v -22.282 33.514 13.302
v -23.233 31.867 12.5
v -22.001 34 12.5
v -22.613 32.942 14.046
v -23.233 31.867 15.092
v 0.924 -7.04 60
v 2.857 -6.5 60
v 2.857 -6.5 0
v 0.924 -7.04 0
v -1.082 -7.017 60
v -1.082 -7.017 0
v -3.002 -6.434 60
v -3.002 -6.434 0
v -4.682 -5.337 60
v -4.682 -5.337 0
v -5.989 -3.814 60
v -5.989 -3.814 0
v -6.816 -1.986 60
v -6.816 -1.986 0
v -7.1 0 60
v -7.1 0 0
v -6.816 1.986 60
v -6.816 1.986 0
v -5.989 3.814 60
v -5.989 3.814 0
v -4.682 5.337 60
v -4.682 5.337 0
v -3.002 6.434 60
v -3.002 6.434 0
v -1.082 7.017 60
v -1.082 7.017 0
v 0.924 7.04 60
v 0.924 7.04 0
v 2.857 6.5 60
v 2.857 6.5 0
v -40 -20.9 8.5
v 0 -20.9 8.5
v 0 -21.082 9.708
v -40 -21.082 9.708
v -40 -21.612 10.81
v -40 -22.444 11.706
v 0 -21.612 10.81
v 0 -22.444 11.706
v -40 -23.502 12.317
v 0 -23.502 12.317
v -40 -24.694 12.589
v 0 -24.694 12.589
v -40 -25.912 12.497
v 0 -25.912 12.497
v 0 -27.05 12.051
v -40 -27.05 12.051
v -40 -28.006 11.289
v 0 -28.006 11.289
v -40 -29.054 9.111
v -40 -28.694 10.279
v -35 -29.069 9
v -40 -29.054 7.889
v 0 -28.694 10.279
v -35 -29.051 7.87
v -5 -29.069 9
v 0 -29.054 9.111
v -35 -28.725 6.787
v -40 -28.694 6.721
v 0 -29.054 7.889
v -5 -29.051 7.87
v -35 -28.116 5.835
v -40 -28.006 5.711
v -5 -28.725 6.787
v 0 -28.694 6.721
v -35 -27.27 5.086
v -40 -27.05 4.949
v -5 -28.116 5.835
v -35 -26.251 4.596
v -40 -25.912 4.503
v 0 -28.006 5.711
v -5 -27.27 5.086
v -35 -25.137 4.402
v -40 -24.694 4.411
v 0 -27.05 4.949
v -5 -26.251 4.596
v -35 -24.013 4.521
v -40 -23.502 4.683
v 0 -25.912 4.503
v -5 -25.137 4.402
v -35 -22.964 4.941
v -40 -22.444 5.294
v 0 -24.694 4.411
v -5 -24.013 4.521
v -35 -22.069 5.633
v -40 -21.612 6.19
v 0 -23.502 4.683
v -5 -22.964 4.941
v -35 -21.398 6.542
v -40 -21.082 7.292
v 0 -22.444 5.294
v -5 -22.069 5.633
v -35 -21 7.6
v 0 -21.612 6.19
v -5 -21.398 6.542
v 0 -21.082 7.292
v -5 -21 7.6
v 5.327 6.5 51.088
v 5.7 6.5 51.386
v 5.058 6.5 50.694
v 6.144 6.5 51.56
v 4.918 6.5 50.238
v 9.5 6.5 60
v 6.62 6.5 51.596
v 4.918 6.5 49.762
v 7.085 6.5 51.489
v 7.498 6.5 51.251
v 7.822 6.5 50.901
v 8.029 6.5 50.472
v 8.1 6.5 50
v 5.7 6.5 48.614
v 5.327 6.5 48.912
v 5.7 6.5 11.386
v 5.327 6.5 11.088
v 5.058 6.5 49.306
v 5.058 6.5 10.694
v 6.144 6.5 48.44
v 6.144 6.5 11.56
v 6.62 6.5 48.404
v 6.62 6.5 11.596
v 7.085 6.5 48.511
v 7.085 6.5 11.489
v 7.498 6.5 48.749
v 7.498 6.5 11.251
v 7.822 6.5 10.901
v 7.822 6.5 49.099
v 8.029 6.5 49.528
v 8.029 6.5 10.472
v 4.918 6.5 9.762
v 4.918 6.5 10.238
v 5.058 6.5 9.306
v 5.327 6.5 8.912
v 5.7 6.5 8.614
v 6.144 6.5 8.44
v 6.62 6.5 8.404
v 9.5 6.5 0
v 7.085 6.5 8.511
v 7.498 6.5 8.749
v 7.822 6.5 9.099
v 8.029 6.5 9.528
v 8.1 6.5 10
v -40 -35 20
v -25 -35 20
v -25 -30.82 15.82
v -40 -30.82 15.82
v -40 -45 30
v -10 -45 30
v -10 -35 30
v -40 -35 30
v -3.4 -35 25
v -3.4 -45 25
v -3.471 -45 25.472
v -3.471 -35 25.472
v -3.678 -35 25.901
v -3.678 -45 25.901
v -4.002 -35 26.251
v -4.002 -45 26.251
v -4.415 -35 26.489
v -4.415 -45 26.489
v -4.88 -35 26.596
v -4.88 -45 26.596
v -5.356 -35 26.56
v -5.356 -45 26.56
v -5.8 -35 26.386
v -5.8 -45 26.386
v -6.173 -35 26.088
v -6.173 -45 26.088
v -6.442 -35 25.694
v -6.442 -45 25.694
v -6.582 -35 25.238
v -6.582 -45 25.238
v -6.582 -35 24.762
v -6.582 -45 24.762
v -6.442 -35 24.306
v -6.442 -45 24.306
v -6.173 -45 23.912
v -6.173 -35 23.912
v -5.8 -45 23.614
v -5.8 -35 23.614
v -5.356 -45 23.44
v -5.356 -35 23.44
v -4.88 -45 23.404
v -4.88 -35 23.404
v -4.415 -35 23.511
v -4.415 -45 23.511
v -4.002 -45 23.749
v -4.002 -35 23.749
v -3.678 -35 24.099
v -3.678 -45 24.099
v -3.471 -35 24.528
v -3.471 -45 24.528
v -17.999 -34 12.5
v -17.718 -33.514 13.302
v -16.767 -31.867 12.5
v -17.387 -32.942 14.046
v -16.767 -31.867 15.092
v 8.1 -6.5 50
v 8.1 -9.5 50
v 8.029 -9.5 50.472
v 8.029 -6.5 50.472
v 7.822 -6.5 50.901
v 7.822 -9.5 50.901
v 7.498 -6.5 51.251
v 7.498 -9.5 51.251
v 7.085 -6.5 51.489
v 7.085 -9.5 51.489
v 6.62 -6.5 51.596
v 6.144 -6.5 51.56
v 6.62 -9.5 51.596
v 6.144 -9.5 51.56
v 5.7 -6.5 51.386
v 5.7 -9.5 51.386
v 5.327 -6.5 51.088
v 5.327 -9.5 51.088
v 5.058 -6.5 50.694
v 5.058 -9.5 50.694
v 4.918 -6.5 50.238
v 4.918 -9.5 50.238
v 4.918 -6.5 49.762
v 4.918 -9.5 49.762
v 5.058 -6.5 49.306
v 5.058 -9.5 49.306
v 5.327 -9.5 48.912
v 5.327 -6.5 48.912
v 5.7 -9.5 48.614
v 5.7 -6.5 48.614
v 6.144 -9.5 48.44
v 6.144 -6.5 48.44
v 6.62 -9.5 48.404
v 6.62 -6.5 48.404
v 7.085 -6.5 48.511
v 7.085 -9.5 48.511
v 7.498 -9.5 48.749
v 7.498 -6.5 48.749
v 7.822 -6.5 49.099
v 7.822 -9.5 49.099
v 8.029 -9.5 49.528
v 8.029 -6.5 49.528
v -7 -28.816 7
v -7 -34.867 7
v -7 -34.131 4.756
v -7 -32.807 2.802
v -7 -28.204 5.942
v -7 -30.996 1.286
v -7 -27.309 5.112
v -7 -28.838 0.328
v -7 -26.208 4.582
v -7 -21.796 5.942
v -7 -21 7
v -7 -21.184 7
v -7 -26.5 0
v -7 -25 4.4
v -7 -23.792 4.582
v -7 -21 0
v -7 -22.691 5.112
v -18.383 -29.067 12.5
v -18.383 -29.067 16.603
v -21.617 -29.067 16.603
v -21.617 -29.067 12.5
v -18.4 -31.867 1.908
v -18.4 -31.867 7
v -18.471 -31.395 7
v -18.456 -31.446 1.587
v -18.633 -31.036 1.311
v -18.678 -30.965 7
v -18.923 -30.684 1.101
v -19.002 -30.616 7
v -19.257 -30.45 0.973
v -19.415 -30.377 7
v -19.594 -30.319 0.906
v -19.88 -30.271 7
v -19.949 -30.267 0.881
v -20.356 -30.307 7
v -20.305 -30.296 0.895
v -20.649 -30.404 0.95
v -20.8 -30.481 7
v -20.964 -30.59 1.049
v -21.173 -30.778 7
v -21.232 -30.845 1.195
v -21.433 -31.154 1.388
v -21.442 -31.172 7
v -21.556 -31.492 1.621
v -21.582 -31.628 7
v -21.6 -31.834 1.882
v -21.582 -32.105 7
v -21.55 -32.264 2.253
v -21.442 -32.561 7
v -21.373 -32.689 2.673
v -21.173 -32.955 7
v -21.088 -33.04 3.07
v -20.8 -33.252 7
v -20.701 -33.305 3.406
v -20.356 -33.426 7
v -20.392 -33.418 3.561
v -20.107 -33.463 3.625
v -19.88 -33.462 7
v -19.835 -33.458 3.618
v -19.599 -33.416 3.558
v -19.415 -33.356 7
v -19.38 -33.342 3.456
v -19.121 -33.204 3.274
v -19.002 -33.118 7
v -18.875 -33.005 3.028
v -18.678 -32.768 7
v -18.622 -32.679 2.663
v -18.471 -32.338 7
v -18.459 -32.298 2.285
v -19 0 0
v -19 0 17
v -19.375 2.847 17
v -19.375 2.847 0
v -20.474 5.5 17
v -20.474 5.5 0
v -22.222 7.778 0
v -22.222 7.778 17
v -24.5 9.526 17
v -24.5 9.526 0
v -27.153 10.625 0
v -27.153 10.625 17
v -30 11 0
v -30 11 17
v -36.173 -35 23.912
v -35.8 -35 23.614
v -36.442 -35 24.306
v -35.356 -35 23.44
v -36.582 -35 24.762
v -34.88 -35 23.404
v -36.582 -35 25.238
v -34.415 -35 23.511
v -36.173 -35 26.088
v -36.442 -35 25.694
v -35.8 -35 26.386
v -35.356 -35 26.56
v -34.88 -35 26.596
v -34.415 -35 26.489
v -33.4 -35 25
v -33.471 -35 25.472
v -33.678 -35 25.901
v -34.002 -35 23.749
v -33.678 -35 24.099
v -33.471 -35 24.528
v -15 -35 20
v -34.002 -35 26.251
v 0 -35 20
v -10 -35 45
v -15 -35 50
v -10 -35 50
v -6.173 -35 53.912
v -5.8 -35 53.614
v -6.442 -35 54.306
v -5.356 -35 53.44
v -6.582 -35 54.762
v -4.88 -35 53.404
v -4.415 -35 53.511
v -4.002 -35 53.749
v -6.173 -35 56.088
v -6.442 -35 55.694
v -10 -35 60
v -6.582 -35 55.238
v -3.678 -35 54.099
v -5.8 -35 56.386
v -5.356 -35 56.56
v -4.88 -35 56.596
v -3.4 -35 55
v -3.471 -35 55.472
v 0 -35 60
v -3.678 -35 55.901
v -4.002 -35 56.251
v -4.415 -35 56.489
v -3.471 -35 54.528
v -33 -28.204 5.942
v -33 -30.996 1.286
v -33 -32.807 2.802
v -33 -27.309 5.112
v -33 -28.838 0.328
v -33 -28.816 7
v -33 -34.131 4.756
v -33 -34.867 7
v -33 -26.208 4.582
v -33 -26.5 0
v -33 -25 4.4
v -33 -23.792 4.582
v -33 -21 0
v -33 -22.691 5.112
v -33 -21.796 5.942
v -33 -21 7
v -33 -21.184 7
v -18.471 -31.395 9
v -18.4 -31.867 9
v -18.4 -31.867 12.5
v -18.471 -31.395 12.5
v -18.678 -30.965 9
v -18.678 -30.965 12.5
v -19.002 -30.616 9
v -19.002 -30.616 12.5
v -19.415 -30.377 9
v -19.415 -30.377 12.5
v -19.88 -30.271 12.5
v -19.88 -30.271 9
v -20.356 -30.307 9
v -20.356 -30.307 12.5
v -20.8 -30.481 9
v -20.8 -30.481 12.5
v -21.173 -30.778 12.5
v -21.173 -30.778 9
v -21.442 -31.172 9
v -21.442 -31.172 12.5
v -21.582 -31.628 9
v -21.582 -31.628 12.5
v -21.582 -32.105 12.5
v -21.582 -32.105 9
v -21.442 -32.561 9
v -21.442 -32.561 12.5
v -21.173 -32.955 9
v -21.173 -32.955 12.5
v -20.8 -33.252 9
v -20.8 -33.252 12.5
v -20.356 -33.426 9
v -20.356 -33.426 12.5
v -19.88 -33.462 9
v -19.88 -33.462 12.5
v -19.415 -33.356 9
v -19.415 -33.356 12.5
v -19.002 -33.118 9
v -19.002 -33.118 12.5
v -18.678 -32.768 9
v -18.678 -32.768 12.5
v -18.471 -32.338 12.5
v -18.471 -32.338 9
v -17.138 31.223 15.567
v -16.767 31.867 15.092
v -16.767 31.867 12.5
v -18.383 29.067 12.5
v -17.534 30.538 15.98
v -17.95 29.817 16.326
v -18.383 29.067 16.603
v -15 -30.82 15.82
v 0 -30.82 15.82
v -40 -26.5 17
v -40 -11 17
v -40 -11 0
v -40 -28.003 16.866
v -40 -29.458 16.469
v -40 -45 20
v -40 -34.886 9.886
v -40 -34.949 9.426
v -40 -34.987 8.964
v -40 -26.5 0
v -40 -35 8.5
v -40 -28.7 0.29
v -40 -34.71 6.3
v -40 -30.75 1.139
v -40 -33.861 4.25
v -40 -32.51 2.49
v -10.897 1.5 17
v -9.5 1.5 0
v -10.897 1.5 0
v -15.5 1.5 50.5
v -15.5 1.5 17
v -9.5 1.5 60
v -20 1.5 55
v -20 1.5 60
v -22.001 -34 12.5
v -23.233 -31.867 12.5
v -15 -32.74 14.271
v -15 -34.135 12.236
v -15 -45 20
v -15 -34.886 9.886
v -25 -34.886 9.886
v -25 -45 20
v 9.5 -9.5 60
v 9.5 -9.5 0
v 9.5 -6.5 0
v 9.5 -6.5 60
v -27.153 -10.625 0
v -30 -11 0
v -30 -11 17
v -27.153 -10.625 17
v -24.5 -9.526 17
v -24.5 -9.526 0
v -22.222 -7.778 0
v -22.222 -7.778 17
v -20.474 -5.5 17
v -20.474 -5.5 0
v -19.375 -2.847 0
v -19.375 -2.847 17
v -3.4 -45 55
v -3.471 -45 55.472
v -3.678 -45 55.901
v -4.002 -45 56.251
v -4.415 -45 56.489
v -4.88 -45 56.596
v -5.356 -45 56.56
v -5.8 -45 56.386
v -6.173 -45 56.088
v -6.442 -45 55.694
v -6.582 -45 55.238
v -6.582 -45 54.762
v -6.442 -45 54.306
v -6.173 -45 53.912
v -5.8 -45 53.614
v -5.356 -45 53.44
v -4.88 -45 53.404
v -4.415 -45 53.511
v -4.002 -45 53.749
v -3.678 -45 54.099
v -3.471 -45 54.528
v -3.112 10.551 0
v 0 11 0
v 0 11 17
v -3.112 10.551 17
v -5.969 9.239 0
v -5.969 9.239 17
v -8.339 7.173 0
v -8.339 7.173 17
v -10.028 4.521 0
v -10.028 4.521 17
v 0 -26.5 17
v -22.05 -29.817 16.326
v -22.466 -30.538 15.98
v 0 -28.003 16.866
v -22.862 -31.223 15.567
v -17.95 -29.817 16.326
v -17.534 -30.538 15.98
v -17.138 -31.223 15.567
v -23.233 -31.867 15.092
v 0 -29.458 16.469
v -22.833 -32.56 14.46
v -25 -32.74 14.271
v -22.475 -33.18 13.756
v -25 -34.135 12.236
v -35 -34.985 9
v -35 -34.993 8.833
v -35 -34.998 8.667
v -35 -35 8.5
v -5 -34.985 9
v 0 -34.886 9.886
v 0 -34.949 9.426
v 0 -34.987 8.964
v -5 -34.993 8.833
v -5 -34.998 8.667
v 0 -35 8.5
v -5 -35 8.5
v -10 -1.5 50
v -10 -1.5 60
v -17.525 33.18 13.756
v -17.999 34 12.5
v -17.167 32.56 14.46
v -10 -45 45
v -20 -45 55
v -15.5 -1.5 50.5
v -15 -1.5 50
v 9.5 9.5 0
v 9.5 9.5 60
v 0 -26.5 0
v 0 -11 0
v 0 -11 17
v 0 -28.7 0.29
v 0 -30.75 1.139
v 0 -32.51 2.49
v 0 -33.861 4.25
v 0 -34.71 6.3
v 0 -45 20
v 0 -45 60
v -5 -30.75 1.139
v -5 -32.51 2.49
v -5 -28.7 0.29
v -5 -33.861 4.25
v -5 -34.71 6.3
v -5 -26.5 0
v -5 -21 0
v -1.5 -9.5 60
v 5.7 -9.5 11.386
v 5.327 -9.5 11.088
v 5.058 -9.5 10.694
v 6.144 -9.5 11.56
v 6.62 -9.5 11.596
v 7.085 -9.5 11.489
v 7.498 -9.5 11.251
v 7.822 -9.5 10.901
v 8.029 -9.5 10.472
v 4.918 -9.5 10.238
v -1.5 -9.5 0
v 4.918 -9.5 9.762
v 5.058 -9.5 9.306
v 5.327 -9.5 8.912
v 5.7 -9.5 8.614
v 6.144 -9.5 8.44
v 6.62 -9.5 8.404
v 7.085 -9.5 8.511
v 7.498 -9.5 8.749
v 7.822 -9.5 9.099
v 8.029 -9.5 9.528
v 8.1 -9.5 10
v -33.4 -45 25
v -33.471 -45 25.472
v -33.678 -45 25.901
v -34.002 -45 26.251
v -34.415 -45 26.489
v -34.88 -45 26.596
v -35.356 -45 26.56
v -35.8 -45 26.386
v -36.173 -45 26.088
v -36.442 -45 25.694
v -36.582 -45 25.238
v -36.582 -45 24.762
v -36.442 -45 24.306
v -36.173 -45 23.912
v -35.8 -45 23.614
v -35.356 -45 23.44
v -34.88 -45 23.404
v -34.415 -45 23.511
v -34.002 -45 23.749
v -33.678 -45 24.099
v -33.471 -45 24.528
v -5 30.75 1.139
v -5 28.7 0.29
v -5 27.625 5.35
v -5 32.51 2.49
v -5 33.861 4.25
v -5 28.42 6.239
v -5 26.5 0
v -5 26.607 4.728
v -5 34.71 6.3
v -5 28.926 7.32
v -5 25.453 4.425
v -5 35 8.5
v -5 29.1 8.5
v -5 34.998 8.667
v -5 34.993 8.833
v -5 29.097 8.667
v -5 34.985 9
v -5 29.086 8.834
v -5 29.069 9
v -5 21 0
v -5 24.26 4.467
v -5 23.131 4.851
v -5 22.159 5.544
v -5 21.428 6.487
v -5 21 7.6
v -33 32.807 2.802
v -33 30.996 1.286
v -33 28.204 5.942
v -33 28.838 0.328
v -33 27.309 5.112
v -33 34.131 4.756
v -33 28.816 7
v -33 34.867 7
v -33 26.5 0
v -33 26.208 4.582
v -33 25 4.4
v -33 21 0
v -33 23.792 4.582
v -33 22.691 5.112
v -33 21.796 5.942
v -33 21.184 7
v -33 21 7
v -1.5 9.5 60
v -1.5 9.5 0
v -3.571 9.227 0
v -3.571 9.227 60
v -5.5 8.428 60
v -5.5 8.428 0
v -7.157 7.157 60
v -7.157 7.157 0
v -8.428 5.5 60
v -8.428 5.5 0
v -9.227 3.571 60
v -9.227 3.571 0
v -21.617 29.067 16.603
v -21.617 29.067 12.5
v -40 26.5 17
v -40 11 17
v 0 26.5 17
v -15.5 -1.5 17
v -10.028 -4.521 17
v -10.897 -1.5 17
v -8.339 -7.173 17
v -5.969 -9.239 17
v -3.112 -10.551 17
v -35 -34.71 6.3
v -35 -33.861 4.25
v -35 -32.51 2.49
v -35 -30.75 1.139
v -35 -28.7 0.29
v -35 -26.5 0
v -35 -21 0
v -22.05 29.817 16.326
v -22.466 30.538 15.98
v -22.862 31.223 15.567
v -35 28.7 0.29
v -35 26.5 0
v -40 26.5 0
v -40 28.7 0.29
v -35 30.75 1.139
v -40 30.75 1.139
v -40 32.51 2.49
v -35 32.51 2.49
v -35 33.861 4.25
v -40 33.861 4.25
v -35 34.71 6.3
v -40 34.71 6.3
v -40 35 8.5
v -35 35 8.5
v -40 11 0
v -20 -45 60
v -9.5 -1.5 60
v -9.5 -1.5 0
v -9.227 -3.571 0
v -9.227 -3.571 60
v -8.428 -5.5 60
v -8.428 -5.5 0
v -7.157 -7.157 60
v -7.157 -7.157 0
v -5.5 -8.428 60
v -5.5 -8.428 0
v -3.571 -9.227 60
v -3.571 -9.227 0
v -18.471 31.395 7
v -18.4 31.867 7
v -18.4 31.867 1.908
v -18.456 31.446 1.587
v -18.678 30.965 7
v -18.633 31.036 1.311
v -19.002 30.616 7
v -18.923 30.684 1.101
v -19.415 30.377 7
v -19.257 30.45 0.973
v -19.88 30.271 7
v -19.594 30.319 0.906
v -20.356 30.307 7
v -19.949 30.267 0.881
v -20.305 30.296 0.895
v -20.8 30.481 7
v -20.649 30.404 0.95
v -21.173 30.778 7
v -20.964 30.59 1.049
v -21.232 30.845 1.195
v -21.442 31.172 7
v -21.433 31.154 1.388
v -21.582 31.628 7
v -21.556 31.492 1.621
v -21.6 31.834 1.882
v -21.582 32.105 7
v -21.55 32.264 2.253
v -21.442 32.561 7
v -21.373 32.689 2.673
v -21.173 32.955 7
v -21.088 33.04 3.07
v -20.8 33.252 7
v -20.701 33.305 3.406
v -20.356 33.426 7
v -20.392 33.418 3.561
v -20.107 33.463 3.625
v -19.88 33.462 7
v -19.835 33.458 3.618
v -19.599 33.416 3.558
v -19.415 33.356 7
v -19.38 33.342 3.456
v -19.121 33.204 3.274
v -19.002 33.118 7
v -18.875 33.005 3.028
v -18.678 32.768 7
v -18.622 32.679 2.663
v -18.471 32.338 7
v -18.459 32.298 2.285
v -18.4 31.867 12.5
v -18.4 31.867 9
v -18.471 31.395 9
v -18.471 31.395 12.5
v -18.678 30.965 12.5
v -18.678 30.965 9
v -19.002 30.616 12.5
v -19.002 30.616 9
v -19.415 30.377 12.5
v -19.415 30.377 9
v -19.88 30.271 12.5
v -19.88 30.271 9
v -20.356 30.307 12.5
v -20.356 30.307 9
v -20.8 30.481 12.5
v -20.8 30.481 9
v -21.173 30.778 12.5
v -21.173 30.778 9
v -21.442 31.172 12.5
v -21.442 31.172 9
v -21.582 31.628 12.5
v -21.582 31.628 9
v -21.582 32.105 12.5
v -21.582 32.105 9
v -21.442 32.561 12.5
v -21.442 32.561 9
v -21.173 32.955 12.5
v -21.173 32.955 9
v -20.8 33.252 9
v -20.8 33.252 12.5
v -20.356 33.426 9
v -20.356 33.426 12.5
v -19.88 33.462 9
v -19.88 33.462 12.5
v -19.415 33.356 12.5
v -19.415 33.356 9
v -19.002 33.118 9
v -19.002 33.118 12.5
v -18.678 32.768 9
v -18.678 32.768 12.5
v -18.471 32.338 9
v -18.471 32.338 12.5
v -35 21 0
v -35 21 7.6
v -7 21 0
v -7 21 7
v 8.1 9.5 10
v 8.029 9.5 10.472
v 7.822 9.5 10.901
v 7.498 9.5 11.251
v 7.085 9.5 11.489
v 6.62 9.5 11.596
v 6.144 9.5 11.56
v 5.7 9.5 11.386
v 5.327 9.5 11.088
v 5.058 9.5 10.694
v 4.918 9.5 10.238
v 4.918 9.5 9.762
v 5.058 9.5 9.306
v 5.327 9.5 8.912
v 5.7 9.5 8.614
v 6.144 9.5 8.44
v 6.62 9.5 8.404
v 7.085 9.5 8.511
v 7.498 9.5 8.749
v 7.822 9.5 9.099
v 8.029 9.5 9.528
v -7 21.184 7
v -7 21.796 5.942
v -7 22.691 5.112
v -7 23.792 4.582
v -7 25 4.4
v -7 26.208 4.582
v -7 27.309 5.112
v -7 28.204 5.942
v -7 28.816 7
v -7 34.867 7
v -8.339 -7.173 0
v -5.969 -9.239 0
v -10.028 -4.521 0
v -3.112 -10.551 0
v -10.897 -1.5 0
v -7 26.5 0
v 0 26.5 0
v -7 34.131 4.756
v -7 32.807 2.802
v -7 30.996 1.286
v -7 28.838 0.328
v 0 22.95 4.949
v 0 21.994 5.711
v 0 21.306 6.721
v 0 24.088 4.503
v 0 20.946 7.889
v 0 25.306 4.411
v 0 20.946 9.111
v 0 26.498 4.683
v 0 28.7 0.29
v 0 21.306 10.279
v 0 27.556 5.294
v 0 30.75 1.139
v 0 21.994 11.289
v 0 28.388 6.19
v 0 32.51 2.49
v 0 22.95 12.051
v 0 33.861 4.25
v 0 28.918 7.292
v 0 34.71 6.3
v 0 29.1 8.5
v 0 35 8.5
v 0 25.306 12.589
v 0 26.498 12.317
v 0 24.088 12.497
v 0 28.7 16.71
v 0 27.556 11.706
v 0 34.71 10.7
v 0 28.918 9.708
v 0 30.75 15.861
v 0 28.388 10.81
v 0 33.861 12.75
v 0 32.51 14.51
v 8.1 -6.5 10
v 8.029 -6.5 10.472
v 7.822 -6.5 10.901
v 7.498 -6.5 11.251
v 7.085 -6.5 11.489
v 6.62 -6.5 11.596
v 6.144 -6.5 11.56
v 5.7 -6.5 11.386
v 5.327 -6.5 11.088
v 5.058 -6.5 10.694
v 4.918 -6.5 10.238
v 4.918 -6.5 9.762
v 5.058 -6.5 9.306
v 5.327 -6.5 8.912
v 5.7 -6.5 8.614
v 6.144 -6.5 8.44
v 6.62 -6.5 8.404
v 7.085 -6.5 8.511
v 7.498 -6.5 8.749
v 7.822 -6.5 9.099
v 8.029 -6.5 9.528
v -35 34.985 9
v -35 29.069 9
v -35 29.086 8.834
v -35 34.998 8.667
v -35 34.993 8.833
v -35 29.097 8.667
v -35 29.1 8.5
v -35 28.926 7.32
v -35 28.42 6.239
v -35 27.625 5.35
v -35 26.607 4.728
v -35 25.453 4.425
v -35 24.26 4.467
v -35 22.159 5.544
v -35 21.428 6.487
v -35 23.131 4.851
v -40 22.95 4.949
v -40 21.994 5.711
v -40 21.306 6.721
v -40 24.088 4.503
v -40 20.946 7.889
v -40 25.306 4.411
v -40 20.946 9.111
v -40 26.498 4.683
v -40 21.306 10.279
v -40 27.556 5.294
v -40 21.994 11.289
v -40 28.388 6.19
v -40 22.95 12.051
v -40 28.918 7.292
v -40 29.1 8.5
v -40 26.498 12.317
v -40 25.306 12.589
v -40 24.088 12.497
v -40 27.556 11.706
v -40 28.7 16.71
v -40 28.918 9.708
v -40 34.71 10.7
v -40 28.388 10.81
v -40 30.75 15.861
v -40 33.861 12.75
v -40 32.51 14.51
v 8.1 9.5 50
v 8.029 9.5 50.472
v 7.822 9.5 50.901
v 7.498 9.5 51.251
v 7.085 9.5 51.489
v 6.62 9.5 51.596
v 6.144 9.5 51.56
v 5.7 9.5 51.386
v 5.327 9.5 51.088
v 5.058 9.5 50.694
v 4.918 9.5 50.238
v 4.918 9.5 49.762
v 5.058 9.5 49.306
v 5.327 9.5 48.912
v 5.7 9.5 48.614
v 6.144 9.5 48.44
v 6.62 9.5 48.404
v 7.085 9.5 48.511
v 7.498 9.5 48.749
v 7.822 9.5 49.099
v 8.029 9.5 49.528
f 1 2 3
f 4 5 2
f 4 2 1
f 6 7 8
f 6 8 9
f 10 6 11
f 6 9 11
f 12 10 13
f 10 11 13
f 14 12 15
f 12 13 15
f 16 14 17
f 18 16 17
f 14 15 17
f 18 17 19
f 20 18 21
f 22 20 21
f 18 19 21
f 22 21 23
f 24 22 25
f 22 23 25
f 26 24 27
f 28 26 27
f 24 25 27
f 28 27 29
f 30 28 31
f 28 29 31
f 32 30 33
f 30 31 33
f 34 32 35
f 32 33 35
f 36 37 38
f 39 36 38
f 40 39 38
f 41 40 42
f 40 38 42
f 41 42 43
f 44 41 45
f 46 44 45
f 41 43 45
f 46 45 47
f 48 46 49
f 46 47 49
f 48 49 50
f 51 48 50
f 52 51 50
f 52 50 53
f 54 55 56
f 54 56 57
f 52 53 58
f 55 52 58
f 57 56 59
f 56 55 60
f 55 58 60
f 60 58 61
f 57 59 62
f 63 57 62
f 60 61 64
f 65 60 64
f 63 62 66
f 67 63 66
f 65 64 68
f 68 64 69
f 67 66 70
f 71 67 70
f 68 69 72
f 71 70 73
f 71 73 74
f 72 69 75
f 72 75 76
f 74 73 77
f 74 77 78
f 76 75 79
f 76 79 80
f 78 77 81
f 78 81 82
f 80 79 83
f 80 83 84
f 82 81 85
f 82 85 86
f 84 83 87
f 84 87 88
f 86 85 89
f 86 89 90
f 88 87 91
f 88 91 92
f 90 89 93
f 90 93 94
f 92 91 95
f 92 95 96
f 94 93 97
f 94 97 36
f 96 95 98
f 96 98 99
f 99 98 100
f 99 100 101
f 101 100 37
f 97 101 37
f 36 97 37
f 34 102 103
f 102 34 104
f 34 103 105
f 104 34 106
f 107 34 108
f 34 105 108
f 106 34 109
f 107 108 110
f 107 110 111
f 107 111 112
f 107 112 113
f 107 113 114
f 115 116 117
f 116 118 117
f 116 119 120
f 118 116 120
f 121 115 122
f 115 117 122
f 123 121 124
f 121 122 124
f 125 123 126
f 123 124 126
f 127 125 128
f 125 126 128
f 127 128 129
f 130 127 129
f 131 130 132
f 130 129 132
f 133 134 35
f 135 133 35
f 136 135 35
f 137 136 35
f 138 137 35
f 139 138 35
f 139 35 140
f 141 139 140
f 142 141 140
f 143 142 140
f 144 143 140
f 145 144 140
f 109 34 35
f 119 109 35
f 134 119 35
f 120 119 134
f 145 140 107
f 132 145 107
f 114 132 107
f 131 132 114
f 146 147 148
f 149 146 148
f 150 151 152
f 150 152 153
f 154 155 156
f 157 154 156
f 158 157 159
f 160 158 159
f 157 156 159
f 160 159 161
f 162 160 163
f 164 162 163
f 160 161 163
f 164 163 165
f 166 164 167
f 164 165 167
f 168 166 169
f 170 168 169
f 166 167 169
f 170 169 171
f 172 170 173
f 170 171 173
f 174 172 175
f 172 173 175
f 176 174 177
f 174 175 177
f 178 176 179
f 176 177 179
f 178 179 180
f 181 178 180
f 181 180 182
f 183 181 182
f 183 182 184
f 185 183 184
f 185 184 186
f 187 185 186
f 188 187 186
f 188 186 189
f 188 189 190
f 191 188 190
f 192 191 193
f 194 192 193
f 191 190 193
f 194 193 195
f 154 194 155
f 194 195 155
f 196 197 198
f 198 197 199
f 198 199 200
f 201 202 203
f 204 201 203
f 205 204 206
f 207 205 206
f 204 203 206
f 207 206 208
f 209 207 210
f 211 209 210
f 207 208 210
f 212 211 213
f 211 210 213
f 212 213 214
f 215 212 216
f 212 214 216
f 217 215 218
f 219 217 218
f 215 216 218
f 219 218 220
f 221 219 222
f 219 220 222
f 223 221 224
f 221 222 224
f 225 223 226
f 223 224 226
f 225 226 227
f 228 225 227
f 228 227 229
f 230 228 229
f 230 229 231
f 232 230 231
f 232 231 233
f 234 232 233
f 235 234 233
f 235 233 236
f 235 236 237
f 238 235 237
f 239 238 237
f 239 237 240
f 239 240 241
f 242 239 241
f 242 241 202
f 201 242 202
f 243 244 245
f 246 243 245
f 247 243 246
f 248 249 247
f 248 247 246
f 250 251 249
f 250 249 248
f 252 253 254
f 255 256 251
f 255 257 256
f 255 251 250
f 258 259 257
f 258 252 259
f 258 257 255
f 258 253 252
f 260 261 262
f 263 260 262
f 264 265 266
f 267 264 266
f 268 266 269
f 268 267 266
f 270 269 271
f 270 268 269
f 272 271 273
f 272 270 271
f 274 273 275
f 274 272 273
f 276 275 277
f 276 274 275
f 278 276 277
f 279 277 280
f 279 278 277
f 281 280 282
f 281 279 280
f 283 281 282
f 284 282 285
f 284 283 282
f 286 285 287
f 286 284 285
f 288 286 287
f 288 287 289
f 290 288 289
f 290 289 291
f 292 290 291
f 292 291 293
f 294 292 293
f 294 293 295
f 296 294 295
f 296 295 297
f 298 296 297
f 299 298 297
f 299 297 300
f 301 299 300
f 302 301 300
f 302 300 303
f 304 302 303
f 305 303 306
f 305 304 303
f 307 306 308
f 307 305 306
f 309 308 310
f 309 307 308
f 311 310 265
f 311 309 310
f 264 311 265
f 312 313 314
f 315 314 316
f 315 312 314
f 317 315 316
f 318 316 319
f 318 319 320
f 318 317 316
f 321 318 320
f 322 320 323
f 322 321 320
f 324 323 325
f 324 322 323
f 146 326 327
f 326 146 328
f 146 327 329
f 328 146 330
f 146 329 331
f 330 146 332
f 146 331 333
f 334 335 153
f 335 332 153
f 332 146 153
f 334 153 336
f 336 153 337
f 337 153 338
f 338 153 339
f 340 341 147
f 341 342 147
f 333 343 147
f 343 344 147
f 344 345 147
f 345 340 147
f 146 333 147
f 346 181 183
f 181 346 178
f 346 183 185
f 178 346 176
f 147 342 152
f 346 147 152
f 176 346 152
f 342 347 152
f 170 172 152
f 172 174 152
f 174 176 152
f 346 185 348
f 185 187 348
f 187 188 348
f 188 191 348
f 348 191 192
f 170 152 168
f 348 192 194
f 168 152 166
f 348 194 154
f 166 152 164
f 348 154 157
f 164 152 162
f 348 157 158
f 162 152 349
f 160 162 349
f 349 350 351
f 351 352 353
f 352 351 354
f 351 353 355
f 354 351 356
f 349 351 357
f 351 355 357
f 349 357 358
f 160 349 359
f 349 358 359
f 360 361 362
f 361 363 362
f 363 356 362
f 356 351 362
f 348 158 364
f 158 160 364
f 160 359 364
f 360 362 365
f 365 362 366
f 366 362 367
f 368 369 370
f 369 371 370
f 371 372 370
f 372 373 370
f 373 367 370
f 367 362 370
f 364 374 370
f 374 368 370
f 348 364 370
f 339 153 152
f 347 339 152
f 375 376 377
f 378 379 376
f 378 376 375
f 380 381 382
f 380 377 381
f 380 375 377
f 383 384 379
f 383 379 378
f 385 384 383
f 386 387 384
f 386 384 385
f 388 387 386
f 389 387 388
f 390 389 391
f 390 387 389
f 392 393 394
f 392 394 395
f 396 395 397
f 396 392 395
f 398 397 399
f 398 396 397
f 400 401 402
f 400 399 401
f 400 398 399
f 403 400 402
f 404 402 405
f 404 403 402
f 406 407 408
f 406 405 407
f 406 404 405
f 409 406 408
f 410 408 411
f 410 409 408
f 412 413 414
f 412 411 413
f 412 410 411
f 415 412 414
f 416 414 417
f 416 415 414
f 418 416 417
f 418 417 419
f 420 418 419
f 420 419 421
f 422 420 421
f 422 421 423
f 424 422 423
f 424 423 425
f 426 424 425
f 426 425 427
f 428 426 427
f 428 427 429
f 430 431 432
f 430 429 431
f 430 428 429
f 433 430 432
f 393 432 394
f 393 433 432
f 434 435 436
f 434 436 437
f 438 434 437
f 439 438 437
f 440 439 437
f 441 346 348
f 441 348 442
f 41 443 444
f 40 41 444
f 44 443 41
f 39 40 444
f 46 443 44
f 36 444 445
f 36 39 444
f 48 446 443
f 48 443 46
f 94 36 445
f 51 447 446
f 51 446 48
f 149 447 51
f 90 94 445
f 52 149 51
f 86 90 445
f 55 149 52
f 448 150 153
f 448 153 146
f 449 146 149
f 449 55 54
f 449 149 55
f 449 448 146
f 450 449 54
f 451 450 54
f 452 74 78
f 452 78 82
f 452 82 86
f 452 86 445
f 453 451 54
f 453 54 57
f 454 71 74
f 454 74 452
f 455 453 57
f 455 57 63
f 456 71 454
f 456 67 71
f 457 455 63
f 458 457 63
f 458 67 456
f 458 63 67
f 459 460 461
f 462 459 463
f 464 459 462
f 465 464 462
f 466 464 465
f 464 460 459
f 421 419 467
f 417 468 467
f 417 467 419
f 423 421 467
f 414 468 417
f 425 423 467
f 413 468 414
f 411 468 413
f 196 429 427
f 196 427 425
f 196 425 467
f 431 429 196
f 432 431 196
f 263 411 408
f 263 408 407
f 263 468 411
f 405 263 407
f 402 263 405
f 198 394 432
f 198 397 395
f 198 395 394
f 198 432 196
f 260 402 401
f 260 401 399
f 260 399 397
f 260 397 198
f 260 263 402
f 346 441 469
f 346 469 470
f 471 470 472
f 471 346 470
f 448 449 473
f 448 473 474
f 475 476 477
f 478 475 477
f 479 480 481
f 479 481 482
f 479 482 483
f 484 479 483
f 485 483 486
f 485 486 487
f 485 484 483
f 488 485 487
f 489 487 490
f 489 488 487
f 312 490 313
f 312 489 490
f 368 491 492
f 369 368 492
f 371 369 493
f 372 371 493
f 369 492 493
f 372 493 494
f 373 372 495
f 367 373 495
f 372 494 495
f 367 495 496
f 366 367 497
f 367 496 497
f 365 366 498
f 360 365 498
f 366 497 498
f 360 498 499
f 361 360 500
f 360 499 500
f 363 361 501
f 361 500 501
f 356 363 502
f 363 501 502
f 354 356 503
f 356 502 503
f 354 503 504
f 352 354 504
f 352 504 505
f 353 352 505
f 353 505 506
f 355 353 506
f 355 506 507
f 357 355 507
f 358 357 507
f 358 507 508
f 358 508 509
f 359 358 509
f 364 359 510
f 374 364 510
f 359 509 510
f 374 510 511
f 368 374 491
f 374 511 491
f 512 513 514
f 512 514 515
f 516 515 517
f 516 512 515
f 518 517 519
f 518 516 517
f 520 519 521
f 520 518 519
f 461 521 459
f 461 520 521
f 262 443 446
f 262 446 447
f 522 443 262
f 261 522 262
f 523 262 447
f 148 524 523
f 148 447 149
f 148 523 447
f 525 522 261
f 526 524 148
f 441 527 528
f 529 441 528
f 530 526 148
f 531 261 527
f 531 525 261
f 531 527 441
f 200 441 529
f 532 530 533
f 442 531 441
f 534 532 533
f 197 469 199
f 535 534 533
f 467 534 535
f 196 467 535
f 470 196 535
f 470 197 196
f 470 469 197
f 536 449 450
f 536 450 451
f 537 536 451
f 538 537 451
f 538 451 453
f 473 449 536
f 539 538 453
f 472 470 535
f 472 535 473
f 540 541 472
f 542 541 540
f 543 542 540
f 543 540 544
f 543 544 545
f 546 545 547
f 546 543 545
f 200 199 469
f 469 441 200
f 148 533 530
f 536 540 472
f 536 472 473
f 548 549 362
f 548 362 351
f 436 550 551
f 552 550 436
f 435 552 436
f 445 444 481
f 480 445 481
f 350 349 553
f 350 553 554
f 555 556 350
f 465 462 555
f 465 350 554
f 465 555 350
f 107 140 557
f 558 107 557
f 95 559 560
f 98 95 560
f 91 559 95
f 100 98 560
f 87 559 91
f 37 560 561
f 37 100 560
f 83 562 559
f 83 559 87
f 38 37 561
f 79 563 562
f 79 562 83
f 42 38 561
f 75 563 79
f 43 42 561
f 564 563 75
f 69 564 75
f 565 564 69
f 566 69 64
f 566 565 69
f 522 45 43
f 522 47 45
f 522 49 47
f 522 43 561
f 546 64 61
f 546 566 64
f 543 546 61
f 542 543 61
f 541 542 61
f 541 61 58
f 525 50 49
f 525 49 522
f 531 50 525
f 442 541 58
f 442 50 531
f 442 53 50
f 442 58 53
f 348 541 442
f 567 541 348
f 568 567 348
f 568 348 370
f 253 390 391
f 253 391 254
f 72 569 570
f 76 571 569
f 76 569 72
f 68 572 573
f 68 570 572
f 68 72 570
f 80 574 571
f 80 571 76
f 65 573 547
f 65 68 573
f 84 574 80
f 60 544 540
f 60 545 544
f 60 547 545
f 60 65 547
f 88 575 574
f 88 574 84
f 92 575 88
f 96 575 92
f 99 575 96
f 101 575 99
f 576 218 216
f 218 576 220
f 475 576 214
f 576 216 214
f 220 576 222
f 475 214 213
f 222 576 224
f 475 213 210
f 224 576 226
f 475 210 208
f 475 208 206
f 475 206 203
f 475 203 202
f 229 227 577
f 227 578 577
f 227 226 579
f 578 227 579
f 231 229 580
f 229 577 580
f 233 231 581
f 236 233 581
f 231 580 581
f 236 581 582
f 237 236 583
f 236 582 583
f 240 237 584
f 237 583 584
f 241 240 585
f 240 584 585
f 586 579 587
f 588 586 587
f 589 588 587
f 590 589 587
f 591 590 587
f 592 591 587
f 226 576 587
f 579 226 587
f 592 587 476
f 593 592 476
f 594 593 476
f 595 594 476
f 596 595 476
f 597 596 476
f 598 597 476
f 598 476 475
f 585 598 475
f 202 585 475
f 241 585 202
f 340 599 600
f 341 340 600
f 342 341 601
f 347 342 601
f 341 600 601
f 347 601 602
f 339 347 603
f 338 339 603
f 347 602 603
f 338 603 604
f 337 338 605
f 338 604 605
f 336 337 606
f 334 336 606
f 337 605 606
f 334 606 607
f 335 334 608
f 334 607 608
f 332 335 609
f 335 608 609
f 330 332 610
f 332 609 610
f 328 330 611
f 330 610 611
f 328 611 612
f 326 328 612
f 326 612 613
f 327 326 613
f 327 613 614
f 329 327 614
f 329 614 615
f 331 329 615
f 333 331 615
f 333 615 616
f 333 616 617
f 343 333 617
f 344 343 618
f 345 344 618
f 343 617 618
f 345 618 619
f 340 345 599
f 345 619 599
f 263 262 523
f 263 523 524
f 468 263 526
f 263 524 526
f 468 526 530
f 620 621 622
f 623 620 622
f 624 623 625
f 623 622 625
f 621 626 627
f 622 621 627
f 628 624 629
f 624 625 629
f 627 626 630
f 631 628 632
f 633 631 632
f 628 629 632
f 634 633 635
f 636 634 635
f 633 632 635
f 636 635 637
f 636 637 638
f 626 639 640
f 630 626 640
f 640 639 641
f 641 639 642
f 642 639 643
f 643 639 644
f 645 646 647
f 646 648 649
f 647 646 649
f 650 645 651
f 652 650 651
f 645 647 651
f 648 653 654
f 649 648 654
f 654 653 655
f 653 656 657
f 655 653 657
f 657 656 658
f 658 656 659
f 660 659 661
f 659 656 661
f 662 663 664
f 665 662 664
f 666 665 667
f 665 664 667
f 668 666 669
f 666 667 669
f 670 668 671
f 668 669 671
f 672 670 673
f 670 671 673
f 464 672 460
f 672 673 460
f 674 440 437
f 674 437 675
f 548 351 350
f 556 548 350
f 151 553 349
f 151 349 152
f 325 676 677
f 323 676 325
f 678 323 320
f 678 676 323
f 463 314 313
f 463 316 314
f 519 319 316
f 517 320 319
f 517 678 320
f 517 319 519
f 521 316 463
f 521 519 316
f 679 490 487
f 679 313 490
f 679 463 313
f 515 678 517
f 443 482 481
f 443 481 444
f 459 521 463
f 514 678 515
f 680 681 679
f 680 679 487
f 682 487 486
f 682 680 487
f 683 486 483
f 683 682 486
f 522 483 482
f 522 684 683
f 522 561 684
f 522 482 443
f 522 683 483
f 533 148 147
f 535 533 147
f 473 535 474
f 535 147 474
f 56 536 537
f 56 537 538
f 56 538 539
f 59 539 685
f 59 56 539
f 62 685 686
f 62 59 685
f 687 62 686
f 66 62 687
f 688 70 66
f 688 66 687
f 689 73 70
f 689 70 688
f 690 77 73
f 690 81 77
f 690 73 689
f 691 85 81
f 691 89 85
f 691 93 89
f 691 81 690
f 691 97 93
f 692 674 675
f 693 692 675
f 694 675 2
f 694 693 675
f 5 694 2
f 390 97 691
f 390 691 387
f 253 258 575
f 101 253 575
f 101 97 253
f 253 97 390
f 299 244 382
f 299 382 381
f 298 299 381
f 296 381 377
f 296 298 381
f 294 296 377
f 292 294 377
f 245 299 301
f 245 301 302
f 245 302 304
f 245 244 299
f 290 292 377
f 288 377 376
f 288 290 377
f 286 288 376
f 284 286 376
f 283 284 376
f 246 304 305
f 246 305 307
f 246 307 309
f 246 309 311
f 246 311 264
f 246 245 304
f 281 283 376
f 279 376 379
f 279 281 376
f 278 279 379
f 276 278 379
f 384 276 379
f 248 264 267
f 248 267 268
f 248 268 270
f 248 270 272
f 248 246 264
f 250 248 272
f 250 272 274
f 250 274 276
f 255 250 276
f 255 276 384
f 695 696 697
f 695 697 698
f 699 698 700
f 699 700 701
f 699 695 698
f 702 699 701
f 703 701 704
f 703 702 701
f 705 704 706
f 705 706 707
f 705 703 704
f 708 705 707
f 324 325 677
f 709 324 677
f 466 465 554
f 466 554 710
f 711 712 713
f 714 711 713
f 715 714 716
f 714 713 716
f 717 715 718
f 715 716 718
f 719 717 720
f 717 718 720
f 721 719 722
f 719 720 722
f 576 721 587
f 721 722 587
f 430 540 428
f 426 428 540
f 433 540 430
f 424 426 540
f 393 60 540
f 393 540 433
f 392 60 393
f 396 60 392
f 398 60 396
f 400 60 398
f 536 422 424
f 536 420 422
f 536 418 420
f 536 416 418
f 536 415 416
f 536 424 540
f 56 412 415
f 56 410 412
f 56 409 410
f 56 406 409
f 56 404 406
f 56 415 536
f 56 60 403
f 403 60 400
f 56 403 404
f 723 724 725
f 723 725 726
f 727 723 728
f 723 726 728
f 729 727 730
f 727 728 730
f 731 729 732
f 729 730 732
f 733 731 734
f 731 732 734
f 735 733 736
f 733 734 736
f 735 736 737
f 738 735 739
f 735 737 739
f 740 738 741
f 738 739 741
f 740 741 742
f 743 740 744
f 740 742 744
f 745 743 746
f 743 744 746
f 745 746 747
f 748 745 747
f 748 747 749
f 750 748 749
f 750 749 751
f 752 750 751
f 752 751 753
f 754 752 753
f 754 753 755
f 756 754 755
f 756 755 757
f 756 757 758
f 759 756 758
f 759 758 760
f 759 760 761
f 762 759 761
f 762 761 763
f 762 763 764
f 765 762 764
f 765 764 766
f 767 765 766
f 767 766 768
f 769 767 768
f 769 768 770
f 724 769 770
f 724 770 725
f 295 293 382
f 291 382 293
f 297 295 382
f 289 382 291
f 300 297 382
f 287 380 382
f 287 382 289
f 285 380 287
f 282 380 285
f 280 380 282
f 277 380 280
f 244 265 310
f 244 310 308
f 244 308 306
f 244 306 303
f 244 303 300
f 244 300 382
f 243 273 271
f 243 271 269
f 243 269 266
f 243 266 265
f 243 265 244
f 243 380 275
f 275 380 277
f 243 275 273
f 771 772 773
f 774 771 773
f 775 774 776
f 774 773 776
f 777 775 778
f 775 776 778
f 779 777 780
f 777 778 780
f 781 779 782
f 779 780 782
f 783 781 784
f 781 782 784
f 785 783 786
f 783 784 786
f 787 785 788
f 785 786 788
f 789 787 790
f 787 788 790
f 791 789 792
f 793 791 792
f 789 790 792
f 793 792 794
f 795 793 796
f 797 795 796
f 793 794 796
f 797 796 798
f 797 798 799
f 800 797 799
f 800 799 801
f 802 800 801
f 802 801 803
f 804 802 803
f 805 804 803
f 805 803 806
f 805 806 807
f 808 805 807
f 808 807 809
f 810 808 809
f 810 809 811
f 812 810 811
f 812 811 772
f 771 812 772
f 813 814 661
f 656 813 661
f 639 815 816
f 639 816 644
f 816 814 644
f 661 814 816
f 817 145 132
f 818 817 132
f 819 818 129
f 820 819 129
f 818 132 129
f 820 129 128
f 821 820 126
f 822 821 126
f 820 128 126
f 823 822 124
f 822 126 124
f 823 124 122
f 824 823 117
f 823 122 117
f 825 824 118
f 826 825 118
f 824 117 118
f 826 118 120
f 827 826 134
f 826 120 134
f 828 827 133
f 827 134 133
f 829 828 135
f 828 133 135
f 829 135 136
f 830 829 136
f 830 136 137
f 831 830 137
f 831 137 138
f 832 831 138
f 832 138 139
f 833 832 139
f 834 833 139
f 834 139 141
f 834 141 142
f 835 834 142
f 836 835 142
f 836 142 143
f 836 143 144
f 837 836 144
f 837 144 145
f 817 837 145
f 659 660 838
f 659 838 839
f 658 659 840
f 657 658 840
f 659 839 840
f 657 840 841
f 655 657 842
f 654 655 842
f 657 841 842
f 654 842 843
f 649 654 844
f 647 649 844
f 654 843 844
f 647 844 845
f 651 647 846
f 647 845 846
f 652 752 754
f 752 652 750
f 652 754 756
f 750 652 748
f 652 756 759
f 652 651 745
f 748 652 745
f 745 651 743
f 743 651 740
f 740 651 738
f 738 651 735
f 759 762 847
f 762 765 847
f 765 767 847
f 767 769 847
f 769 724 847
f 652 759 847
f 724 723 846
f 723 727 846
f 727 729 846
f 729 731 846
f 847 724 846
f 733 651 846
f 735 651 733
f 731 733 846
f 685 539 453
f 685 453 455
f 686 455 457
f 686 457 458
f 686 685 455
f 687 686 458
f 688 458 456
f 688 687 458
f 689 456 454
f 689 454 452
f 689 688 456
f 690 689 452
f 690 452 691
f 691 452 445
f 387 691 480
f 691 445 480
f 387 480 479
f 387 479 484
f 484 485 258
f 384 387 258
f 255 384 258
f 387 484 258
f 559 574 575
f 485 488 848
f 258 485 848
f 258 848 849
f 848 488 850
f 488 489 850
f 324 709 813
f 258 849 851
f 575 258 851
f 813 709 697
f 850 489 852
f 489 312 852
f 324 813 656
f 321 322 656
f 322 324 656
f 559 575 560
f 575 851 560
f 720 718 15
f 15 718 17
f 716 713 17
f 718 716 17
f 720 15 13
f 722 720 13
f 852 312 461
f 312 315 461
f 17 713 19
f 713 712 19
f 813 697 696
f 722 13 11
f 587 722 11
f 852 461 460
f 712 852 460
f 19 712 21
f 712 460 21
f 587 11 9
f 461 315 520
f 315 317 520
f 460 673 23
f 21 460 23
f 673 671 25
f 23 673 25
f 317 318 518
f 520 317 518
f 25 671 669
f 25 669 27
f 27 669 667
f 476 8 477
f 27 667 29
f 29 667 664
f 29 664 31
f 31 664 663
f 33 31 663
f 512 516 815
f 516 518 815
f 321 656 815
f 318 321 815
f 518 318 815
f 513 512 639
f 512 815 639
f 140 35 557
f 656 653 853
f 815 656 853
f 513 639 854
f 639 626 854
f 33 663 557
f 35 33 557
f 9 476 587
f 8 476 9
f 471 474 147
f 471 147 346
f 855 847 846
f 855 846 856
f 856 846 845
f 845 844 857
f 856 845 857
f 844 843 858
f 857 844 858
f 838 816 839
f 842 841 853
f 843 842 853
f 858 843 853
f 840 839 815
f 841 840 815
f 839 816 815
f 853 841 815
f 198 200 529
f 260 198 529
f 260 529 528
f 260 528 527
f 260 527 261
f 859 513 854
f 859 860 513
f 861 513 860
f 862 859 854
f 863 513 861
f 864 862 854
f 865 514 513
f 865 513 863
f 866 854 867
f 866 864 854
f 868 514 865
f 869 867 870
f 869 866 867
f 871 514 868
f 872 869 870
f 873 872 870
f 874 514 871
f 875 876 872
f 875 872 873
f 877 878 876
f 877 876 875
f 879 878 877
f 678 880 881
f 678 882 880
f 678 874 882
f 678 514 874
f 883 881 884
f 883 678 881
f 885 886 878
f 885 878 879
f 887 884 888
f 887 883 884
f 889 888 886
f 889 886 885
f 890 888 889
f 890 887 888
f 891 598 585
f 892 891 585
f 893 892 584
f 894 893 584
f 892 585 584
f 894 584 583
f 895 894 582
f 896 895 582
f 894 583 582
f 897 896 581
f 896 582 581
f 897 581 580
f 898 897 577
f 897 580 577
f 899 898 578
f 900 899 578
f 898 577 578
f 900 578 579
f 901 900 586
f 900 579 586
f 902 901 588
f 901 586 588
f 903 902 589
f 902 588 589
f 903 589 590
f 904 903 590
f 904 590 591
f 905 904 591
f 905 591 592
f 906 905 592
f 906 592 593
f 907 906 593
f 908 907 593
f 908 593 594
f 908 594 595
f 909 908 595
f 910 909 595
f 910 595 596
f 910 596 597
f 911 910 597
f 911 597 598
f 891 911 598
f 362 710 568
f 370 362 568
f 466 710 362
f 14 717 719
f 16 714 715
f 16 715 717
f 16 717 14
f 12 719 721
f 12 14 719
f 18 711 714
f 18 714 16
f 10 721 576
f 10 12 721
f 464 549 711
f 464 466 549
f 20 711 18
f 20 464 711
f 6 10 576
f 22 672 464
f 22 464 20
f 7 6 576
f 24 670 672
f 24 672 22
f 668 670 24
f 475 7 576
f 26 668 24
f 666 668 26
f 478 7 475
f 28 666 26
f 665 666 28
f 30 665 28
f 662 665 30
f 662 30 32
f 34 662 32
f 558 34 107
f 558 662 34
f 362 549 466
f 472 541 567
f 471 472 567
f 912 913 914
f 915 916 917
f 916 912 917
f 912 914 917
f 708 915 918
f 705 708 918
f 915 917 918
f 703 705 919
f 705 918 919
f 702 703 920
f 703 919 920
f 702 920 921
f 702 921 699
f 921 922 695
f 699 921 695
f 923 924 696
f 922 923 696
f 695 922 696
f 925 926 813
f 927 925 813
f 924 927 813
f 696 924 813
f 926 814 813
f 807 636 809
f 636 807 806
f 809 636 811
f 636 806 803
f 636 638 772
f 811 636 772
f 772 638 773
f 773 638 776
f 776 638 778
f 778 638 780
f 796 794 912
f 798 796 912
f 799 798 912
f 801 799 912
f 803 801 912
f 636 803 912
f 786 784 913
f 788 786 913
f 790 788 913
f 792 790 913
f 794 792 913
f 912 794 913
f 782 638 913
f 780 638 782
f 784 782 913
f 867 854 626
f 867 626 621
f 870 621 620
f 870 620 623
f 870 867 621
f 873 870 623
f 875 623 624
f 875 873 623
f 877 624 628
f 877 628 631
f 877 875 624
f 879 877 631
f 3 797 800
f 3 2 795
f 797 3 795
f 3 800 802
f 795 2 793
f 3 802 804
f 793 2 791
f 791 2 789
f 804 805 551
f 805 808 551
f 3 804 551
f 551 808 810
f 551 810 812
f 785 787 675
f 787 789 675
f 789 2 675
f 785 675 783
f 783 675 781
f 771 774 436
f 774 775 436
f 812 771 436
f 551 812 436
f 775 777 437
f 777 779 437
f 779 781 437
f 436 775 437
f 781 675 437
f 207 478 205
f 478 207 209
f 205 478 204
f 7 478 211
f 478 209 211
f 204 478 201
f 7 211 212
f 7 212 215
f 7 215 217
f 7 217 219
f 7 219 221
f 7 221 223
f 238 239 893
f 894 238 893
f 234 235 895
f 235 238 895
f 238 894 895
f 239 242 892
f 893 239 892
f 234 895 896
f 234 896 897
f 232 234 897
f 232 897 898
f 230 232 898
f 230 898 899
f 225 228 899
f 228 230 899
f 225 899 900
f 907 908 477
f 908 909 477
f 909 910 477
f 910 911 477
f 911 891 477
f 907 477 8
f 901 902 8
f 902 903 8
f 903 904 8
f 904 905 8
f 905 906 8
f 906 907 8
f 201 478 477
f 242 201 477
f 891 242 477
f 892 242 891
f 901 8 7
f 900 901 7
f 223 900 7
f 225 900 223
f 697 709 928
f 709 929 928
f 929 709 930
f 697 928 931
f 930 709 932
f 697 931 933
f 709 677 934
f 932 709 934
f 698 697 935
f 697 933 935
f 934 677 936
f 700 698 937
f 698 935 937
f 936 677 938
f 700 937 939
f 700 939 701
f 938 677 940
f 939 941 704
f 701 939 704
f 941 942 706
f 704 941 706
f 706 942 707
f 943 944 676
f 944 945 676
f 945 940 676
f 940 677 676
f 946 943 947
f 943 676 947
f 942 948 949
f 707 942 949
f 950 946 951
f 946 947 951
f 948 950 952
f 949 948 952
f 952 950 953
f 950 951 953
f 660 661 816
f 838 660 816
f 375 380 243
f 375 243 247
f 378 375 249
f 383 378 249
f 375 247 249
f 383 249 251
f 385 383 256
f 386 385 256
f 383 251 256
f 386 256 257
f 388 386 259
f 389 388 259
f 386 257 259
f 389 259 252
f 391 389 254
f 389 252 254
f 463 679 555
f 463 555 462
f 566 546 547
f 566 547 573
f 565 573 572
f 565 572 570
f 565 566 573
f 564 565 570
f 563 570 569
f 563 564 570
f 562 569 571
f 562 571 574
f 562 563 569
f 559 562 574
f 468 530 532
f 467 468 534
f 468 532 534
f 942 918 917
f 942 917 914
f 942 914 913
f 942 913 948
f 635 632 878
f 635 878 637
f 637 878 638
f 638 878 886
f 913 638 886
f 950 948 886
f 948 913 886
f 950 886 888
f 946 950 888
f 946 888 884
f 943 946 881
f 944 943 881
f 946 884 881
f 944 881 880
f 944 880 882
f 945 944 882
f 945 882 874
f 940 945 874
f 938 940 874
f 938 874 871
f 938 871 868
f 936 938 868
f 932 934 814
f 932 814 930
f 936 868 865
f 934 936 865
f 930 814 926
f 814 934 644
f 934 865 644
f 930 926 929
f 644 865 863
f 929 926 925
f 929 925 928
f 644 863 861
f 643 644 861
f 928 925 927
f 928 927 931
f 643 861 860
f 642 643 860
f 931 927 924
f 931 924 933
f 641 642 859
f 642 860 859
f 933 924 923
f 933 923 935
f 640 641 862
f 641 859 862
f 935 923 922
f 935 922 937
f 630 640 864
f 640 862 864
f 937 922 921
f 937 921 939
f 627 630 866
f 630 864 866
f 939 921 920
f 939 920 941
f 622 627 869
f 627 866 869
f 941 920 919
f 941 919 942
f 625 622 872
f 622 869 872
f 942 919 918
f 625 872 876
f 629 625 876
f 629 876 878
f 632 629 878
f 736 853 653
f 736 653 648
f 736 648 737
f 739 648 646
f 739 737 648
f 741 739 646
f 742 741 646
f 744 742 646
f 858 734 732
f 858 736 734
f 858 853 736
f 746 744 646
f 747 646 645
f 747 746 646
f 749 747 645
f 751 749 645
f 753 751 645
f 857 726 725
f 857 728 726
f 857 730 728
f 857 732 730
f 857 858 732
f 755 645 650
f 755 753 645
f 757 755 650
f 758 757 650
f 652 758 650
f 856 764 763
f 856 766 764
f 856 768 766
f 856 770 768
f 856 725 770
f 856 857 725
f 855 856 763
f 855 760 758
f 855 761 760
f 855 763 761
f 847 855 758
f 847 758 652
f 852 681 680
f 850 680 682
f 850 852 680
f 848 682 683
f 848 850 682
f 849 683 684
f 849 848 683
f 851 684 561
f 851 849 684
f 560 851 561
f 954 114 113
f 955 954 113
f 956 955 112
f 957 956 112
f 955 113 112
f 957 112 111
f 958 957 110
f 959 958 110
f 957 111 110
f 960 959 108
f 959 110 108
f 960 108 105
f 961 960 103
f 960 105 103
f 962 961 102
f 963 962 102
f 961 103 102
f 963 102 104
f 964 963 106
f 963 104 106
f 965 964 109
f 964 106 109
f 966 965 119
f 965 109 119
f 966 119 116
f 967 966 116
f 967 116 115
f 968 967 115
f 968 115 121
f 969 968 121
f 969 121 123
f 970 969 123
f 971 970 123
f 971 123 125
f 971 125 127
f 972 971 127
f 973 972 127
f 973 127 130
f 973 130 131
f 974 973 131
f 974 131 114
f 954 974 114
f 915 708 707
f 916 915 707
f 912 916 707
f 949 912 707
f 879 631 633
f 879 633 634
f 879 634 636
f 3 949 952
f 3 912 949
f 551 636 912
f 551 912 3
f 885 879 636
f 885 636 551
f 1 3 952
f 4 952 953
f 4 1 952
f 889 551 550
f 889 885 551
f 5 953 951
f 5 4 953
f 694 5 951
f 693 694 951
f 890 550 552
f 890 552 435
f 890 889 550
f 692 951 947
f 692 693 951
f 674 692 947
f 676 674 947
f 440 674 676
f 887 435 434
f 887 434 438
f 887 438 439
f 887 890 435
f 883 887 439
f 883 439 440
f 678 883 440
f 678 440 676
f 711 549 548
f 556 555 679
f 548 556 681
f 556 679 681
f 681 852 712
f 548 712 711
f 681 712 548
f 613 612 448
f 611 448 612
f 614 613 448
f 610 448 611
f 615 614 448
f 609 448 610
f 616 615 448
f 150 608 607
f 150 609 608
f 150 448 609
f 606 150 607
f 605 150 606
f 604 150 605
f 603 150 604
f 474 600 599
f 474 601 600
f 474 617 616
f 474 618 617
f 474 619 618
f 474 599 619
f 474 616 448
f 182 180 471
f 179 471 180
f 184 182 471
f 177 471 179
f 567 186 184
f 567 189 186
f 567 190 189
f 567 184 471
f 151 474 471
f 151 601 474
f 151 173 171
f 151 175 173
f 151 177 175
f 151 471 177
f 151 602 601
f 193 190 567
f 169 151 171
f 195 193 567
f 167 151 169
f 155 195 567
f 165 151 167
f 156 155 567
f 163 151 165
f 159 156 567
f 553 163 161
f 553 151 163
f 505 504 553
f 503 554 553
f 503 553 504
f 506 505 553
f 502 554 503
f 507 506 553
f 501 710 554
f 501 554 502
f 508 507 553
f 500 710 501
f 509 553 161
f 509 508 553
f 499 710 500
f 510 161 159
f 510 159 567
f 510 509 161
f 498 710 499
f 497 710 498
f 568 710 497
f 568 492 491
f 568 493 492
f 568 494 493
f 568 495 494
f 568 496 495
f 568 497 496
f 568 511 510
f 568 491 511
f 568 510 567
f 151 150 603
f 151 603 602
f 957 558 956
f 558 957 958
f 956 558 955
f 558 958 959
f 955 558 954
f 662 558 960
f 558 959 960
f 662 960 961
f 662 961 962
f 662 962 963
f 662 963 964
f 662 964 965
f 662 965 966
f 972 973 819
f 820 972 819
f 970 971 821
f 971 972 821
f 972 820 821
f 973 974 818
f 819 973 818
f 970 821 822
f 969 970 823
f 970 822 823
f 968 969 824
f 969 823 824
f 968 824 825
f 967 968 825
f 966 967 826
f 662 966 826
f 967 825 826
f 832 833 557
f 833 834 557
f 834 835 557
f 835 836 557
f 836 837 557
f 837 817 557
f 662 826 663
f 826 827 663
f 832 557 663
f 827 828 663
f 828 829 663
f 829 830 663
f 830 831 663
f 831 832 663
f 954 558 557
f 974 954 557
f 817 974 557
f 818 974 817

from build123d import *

# Parameters (mm, degrees)
F1_R      = 4.1
F2_DEPTH  = 40
F3_R      = 11
F4_DEPTH  = 17
F5_W      = 6
F5_H      = 3
F6_DEPTH  = 60
F7_R      = 1.6
F8_DEPTH  = 19
F10_DEPTH = 17
F11_W     = 2
F11_H     = 7
F11_H_2   = 2
F11_W_2   = 26
F12_DEPTH = 15
F13_R     = 1.6
F14_DEPTH = 17
F16_DEPTH = 4.5
F19_DEPTH = 15
F21_R     = 1.6
F22_DEPTH = 10
F24_DEPTH = 46.5


# Not quite as in the source:
# - a pattern or mirror of a feature is missing from the dataset's text; its kind, count and spacing are read off the source's solid


with BuildPart() as f2:
    # F1 (on Right) → F2 (new body)
    with BuildSketch(Plane.YZ):
        with BuildLine():
            ThreePointArc((-35, 8.5), (-32.5104076401, 2.4895923599), (-26.5, 0))
            Line((-26.5, 0), (26.5, 0))
            ThreePointArc((26.5, 0), (32.5104076401, 2.4895923599), (35, 8.5))
            ThreePointArc((35, 8.5), (32.5104076401, 14.5104076401), (26.5, 17))
            Line((26.5, 17), (-26.5, 17))
            ThreePointArc((-26.5, 17), (-32.5104076401, 14.5104076401), (-35, 8.5))
        make_face()
        with Locations((-25, 8.5)):
            Circle(F1_R, mode=Mode.SUBTRACT)
        with Locations((25, 8.5)):
            Circle(F1_R, mode=Mode.SUBTRACT)
    extrude(amount=-F2_DEPTH)

    # F3 (on Top) → F4 (cut)
    with BuildSketch(Plane.XY):
        Circle(F3_R)
    extrude(amount=F4_DEPTH, mode=Mode.SUBTRACT)

    # F5 (on Top) → F6 (join)
    with BuildSketch(Plane.XY):
        with BuildLine():
            Line((9.5, 6.5), (9.5, 9.5))
            Line((9.5, 9.5), (-1.5, 9.5))
            ThreePointArc((-1.5, 9.5), (-7.1568542495, 7.1568542495), (-9.5, 1.5))
            Line((-9.5, 1.5), (-9.5, -1.5))
            ThreePointArc((-9.5, -1.5), (-7.1568542495, -7.1568542495), (-1.5, -9.5))
            Line((-1.5, -9.5), (9.5, -9.5))
            Line((9.5, -9.5), (9.5, -6.5))
            Line((9.5, -6.5), (2.8565713714, -6.5))
            ThreePointArc((2.8565713714, -6.5), (-7.1, 0), (2.8565713714, 6.5))
            Line((2.8565713714, 6.5), (9.5, 6.5))
        make_face()
        with Locations((-12.5, 0)):
            Rectangle(F5_W, F5_H)
    extrude(amount=F6_DEPTH)

    # F7 (on face) → F8 (cut)
    with BuildSketch(Plane.XZ.offset(9.5)):
        with Locations((6.5, 50)):
            Circle(F7_R)
        with Locations((6.5, 10)):
            Circle(F7_R)
    extrude(amount=-F8_DEPTH, mode=Mode.SUBTRACT)

    # F9 (on Top) → F10 (cut)
    with BuildSketch(Plane.XY):
        with BuildLine():
            ThreePointArc((-19, 0), (-22.2218254069, 7.7781745931), (-30, 11))
            Line((-30, 11), (-41, 11))
            Line((-41, 11), (-41, -11))
            Line((-41, -11), (-30, -11))
            ThreePointArc((-30, -11), (-22.2218254069, -7.7781745931), (-19, 0))
        make_face()
    extrude(amount=F10_DEPTH, mode=Mode.SUBTRACT)

    # F11 (on offset) → F12 (cut)
    with BuildSketch(Plane.XZ.offset(21)):
        with Locations((-6, 3.5)):
            Rectangle(F11_W, F11_H)
        with Locations((-6, 8)):
            Rectangle(F11_W, F11_H_2)
        with Locations((-20, 8)):
            Rectangle(F11_W_2, F11_H_2)
        with Locations((-34, 8)):
            Rectangle(F11_W, F11_H_2)
        with Locations((-34, 3.5)):
            Rectangle(F11_W, F11_H)
    f12 = extrude(amount=F12_DEPTH, mode=Mode.SUBTRACT)

    # F12_copies: F12 across plane
    add(f12.mirror(Plane.ZX), mode=Mode.SUBTRACT)

    # F13 (on Top) → F14 (cut)
    with BuildSketch(Plane.XY):
        with Locations((-20, -31.8666002653)):
            Circle(F13_R)
    f14 = extrude(amount=F14_DEPTH, mode=Mode.SUBTRACT)

    # F14_copies: F14 across plane
    add(f14.mirror(Plane.ZX), mode=Mode.SUBTRACT)

    # F15 (on face) → F16 (cut)
    with BuildSketch(Plane.XY.offset(17)):
        Polygon((-21.6165807537, -29.0666002653), (-23.2331615075, -31.8666002653), (-21.6165807537, -34.6666002653), (-18.3834192463, -34.6666002653), (-16.7668384925, -31.8666002653), (-18.3834192463, -29.0666002653), align=None)
    f16 = extrude(amount=-F16_DEPTH, mode=Mode.SUBTRACT)

    # F16_copies: F16 across plane
    add(f16.mirror(Plane.ZX), mode=Mode.SUBTRACT)

    # F18 (on face) → F19 (join)
    with BuildSketch(Plane(origin=(-40, 0, 0), x_dir=(0, -1, 0), z_dir=(-1, 0, 0))):
        Polygon((34.8862050714, 9.8862050714), (45, 20), (35, 20), (29.8862050714, 14.8862050714), align=None)
    f19 = extrude(amount=-F19_DEPTH)

    # F19_copies: F19 across plane
    add(f19.mirror(Plane(origin=(-20, 0, 0), x_dir=(0, 0, 1), z_dir=(1, 0, 0))))

    # F21 (on offset) → F22 (join)
    with BuildSketch(Plane.XZ.offset(45)):
        Polygon((-40, 20), (0, 20), (0, 60), (-10, 60), (-20, 60), (-20, 55), (-10, 45), (-10, 30), (-40, 30), align=None)
        with Locations((-35, 25)):
            Circle(F21_R, mode=Mode.SUBTRACT)
        with Locations((-5, 25)):
            Circle(F21_R, mode=Mode.SUBTRACT)
        with Locations((-5, 55)):
            Circle(F21_R, mode=Mode.SUBTRACT)
    extrude(amount=-F22_DEPTH)

    # F23 (on face) → F24 (join)
    with BuildSketch(Plane(origin=(0, 1.5, 0), x_dir=(-1, 0, 0), z_dir=(0, 1, 0))):
        Polygon((20, 60), (10, 60), (10, 50), (15, 50), (20, 55), align=None)
    extrude(amount=-F24_DEPTH)


solid = f2.part
